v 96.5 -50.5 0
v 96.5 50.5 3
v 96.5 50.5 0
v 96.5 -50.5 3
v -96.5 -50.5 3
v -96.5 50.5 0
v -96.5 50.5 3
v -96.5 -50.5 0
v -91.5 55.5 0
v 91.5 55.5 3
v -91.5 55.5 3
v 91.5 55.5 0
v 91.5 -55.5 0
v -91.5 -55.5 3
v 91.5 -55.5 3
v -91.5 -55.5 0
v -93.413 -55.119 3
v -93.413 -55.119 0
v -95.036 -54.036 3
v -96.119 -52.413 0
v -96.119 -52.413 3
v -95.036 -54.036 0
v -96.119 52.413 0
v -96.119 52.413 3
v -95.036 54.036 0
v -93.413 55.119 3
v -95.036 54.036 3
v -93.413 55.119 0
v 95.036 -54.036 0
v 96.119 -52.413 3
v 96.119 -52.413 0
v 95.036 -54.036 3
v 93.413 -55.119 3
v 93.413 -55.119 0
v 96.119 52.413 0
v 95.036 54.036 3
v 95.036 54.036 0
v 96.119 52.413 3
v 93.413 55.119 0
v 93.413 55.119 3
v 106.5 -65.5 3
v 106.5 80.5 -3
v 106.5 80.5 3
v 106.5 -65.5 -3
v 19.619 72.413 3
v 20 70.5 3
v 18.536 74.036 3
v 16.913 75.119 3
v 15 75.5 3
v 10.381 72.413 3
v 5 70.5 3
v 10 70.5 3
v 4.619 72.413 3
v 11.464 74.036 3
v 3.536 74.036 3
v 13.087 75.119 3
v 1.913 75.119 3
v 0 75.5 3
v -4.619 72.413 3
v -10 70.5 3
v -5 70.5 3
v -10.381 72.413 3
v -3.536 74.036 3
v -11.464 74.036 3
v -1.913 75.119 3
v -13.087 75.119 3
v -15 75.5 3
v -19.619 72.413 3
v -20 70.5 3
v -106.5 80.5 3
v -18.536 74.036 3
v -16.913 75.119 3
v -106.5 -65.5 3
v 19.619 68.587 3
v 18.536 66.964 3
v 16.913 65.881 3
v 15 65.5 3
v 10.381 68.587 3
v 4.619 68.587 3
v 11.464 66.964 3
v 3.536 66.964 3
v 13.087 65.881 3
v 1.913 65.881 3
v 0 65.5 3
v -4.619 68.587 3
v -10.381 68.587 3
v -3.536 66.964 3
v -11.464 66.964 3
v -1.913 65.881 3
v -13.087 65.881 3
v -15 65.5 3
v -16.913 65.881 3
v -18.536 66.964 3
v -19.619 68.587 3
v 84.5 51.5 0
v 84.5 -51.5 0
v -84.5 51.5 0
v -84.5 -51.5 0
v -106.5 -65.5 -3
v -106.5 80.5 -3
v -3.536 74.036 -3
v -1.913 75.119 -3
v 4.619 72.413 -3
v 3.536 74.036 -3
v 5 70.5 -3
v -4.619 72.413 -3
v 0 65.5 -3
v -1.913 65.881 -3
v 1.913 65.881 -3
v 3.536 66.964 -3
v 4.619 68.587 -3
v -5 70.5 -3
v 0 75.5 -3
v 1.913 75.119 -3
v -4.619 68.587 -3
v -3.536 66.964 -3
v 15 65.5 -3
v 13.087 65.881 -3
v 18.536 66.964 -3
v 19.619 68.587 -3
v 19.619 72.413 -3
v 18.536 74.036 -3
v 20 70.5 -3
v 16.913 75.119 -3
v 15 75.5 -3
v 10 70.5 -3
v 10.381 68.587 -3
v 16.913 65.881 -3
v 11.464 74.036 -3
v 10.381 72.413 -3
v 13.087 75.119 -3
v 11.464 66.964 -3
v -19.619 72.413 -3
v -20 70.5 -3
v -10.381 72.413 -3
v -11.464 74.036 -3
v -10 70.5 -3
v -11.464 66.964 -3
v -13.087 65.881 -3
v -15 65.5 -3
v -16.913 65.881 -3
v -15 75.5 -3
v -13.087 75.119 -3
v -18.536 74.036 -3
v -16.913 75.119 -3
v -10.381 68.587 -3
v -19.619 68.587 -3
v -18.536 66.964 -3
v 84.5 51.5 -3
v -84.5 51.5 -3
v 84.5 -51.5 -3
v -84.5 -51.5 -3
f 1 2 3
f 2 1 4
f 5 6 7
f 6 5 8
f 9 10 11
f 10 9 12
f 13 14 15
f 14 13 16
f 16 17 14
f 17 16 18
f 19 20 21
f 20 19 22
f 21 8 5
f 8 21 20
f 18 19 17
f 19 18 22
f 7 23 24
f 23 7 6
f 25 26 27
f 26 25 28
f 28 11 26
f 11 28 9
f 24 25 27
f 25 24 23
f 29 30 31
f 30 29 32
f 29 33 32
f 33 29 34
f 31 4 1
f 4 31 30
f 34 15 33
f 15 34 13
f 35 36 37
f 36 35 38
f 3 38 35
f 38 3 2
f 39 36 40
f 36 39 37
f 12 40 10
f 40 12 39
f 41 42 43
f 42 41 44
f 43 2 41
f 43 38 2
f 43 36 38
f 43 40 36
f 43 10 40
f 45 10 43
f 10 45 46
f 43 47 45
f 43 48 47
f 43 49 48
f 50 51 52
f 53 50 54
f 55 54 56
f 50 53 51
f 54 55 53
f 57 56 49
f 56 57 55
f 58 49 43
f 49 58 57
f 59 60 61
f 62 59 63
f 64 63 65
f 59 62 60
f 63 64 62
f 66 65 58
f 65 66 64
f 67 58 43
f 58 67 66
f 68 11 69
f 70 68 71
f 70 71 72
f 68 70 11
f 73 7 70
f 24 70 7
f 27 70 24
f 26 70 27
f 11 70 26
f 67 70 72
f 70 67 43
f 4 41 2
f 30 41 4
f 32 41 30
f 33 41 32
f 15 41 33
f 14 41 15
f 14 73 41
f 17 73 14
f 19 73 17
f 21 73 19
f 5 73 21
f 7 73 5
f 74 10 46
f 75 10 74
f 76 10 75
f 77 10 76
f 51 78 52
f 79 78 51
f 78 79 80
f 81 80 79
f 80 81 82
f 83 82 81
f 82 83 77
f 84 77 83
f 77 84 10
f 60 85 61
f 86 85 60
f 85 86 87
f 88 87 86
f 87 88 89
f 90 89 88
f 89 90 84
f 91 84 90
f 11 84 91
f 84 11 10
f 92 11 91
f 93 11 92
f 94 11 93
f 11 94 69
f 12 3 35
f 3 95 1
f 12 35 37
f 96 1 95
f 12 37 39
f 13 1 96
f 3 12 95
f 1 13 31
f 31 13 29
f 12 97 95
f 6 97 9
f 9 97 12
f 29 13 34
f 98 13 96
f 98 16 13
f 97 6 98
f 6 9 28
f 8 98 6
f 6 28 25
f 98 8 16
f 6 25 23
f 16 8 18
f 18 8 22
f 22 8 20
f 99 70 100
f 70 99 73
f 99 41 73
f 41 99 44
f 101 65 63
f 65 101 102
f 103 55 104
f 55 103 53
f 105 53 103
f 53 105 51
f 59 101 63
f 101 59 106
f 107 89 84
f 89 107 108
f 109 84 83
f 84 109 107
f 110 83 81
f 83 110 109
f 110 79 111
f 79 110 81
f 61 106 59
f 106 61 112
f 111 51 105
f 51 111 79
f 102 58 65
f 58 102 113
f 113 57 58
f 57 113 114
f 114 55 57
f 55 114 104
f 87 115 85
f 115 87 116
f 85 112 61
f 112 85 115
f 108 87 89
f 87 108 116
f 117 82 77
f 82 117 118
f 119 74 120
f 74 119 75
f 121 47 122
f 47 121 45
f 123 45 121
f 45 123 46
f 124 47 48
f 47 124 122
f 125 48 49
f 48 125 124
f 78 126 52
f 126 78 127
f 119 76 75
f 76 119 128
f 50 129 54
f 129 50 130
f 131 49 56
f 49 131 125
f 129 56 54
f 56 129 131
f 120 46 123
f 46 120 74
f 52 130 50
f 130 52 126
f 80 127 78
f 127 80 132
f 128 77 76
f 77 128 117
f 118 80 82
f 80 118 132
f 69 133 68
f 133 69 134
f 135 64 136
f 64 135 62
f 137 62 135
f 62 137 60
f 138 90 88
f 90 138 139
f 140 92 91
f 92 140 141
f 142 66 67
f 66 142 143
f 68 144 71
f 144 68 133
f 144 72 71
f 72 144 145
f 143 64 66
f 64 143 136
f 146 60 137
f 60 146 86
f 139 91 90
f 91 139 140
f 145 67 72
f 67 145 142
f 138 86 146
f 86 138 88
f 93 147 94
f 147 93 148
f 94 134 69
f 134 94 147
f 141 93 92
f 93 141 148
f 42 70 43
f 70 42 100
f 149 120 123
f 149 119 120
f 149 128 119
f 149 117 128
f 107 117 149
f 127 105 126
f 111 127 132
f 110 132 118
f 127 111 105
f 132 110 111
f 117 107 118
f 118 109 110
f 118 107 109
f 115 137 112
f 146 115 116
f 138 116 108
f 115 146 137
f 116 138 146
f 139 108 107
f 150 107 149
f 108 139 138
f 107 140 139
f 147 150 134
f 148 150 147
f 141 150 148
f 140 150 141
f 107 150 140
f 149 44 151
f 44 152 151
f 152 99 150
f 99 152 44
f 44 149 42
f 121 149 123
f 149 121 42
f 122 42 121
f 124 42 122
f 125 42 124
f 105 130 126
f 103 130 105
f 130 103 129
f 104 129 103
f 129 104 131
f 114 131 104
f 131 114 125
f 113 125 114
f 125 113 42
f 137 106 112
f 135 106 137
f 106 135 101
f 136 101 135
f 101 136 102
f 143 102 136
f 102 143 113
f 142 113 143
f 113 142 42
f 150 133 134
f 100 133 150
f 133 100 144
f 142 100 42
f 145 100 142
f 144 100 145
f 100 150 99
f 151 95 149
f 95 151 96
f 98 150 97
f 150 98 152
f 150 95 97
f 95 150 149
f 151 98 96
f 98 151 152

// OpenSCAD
module case_screen_rpi_7inch_buttons(CASE_W=213,CASE_H=3,CASE_BUTTON_L=15,CASE_BUTTON_R=5)
{
    difference()
    {
        cube([CASE_W,CASE_BUTTON_L,CASE_H], center=true);
        translate([0,-CASE_BUTTON_L/2+CASE_BUTTON_R,0])
        {
            cylinder(h=CASE_H+2,r=CASE_BUTTON_R, center=true);
            translate([CASE_BUTTON_R*3,0,0])
            cylinder(h=CASE_H+2,r=CASE_BUTTON_R, center=true);
            translate([-CASE_BUTTON_R*3,0,0])
            cylinder(h=CASE_H+2,r=CASE_BUTTON_R, center=true);
        }
    }
}

module case_screen_rpi_7inch_type1_pc1(CASE_W=213,CASE_L=131,CASE_H=3,CASE_BUTTON_L=15,CASE_BUTTON_R=5,CASE_BUTTON_E=true)
{
    
    /////////////////////////////////////////////////////////////////////////////////////
    // DATA
    /////////////////////////////////////////////////////////////////////////////////////

    RP3_7INCH_SCREEN_W=193.0;
    RP3_7INCH_SCREEN_L=111.0;
    
    RP3_7INCH_SCREEN_H=CASE_H+2;//este valor es para restar solmente
    RP3_7INCH_SCREEN_R=5;
    
    if(CASE_W<RP3_7INCH_SCREEN_W)
    {
        echo("<font color='red'> CASE_W is less than rpi 7inch (193 mm) </font>");
        assert(false);
    }
    
    if(CASE_L<RP3_7INCH_SCREEN_L)
    {
        echo("<font color='red'> CASE_L is less than rpi 7inch (110 mm) </font>");
        assert(false);
    }
    

    
    /////////////////////////////////////////////////////////////////////////////////////
    // SCREEN 
    /////////////////////////////////////////////////////////////////////////////////////
    
    color("Black")
    translate([0,0,CASE_H/2])
    difference()
    {
        cube([CASE_W,CASE_L,CASE_H], center=true);
        union()
        {
            translate([-RP3_7INCH_SCREEN_W/2+RP3_7INCH_SCREEN_R,-RP3_7INCH_SCREEN_L/2+RP3_7INCH_SCREEN_R,0])  
                cylinder(h=RP3_7INCH_SCREEN_H,r=RP3_7INCH_SCREEN_R, center=true);
            translate([-RP3_7INCH_SCREEN_W/2+RP3_7INCH_SCREEN_R,+RP3_7INCH_SCREEN_L/2-RP3_7INCH_SCREEN_R,0])  
                cylinder(h=RP3_7INCH_SCREEN_H,r=RP3_7INCH_SCREEN_R, center=true);
            translate([+RP3_7INCH_SCREEN_W/2-RP3_7INCH_SCREEN_R,-RP3_7INCH_SCREEN_L/2+RP3_7INCH_SCREEN_R,0])  
                cylinder(h=RP3_7INCH_SCREEN_H,r=RP3_7INCH_SCREEN_R, center=true);
            translate([+RP3_7INCH_SCREEN_W/2-RP3_7INCH_SCREEN_R,+RP3_7INCH_SCREEN_L/2-RP3_7INCH_SCREEN_R,0])  
                cylinder(h=RP3_7INCH_SCREEN_H,r=RP3_7INCH_SCREEN_R, center=true);
 
            difference()
            {
                cube([RP3_7INCH_SCREEN_W,RP3_7INCH_SCREEN_L,RP3_7INCH_SCREEN_H], center=true);
    
                translate([-RP3_7INCH_SCREEN_W/2,-RP3_7INCH_SCREEN_L/2,0])  
                    cube([RP3_7INCH_SCREEN_R*2,RP3_7INCH_SCREEN_R*2,RP3_7INCH_SCREEN_H+10], center=true);
                translate([-RP3_7INCH_SCREEN_W/2,+RP3_7INCH_SCREEN_L/2,0])  
                    cube([RP3_7INCH_SCREEN_R*2,RP3_7INCH_SCREEN_R*2,RP3_7INCH_SCREEN_H+10], center=true);
                translate([+RP3_7INCH_SCREEN_W/2,-RP3_7INCH_SCREEN_L/2,0])  
                    cube([RP3_7INCH_SCREEN_R*2,RP3_7INCH_SCREEN_R*2,RP3_7INCH_SCREEN_H+10], center=true);
                translate([+RP3_7INCH_SCREEN_W/2,+RP3_7INCH_SCREEN_L/2,0])  
                    cube([RP3_7INCH_SCREEN_R*2,RP3_7INCH_SCREEN_R*2,RP3_7INCH_SCREEN_H+10], center=true);        
            }
        }
    }

    /////////////////////////////////////////////////////////////////////////////////////
    // BUTTON
    /////////////////////////////////////////////////////////////////////////////////////
    translate([0,CASE_L/2+CASE_BUTTON_L/2,CASE_H/2])
    if(CASE_BUTTON_E==true)
    {   
        case_screen_rpi_7inch_buttons(CASE_W=CASE_W,CASE_H=CASE_H,CASE_BUTTON_L=CASE_BUTTON_L,CASE_BUTTON_R=CASE_BUTTON_R);
    }

}

module case_screen_rpi_7inch_type1_pc2(CASE_W=213,CASE_L=131,CASE_H=3,CASE_BUTTON_L=15,CASE_BUTTON_R=5,CASE_BUTTON_E=true)
{
    
    /////////////////////////////////////////////////////////////////////////////////////
    // DATA
    /////////////////////////////////////////////////////////////////////////////////////

    RP3_7INCH_SCREEN_W=193.0;
    RP3_7INCH_SCREEN_L=111.0;
    
    RP3_7INCH_SCREEN_H=CASE_H+2;//este valor es para restar solmente
    RP3_7INCH_SCREEN_R=5;
    
    if(CASE_W<RP3_7INCH_SCREEN_W)
    {
        echo("<font color='red'> CASE_W is less than rpi 7inch (193 mm) </font>");
        assert(false);
    }
    
    if(CASE_L<RP3_7INCH_SCREEN_L)
    {
        echo("<font color='red'> CASE_L is less than rpi 7inch (110 mm) </font>");
        assert(false);
    }
    
    /////////////////////////////////////////////////////////////////////////////////////
    // METAL
    /////////////////////////////////////////////////////////////////////////////////////
    
    RP3_7INCH_METAL_W=RP3_7INCH_SCREEN_W-24;
    RP3_7INCH_METAL_L=RP3_7INCH_SCREEN_L-8;
    RP3_7INCH_METAL_H=CASE_H+2;    

    color("Silver")
    translate([0,0,-CASE_H/2])
    difference()
    {
        cube([CASE_W,CASE_L,CASE_H], center=true);
        
        cube([RP3_7INCH_METAL_W,RP3_7INCH_METAL_L,RP3_7INCH_METAL_H], center=true);
    }
    
    /////////////////////////////////////////////////////////////////////////////////////
    // BUTTON
    /////////////////////////////////////////////////////////////////////////////////////
    translate([0,CASE_L/2+CASE_BUTTON_L/2,-CASE_H/2])
    if(CASE_BUTTON_E==true)
    {   
        case_screen_rpi_7inch_buttons(CASE_W=CASE_W,CASE_H=CASE_H,CASE_BUTTON_L=CASE_BUTTON_L,CASE_BUTTON_R=CASE_BUTTON_R);
    }
}

module case_screen_rpi_7inch_type1()
{
    case_screen_rpi_7inch_type1_pc1();
    case_screen_rpi_7inch_type1_pc2();
}

case_screen_rpi_7inch_type1_pc1();
case_screen_rpi_7inch_type1_pc2();
//case_screen_rpi_7inch_type1();
